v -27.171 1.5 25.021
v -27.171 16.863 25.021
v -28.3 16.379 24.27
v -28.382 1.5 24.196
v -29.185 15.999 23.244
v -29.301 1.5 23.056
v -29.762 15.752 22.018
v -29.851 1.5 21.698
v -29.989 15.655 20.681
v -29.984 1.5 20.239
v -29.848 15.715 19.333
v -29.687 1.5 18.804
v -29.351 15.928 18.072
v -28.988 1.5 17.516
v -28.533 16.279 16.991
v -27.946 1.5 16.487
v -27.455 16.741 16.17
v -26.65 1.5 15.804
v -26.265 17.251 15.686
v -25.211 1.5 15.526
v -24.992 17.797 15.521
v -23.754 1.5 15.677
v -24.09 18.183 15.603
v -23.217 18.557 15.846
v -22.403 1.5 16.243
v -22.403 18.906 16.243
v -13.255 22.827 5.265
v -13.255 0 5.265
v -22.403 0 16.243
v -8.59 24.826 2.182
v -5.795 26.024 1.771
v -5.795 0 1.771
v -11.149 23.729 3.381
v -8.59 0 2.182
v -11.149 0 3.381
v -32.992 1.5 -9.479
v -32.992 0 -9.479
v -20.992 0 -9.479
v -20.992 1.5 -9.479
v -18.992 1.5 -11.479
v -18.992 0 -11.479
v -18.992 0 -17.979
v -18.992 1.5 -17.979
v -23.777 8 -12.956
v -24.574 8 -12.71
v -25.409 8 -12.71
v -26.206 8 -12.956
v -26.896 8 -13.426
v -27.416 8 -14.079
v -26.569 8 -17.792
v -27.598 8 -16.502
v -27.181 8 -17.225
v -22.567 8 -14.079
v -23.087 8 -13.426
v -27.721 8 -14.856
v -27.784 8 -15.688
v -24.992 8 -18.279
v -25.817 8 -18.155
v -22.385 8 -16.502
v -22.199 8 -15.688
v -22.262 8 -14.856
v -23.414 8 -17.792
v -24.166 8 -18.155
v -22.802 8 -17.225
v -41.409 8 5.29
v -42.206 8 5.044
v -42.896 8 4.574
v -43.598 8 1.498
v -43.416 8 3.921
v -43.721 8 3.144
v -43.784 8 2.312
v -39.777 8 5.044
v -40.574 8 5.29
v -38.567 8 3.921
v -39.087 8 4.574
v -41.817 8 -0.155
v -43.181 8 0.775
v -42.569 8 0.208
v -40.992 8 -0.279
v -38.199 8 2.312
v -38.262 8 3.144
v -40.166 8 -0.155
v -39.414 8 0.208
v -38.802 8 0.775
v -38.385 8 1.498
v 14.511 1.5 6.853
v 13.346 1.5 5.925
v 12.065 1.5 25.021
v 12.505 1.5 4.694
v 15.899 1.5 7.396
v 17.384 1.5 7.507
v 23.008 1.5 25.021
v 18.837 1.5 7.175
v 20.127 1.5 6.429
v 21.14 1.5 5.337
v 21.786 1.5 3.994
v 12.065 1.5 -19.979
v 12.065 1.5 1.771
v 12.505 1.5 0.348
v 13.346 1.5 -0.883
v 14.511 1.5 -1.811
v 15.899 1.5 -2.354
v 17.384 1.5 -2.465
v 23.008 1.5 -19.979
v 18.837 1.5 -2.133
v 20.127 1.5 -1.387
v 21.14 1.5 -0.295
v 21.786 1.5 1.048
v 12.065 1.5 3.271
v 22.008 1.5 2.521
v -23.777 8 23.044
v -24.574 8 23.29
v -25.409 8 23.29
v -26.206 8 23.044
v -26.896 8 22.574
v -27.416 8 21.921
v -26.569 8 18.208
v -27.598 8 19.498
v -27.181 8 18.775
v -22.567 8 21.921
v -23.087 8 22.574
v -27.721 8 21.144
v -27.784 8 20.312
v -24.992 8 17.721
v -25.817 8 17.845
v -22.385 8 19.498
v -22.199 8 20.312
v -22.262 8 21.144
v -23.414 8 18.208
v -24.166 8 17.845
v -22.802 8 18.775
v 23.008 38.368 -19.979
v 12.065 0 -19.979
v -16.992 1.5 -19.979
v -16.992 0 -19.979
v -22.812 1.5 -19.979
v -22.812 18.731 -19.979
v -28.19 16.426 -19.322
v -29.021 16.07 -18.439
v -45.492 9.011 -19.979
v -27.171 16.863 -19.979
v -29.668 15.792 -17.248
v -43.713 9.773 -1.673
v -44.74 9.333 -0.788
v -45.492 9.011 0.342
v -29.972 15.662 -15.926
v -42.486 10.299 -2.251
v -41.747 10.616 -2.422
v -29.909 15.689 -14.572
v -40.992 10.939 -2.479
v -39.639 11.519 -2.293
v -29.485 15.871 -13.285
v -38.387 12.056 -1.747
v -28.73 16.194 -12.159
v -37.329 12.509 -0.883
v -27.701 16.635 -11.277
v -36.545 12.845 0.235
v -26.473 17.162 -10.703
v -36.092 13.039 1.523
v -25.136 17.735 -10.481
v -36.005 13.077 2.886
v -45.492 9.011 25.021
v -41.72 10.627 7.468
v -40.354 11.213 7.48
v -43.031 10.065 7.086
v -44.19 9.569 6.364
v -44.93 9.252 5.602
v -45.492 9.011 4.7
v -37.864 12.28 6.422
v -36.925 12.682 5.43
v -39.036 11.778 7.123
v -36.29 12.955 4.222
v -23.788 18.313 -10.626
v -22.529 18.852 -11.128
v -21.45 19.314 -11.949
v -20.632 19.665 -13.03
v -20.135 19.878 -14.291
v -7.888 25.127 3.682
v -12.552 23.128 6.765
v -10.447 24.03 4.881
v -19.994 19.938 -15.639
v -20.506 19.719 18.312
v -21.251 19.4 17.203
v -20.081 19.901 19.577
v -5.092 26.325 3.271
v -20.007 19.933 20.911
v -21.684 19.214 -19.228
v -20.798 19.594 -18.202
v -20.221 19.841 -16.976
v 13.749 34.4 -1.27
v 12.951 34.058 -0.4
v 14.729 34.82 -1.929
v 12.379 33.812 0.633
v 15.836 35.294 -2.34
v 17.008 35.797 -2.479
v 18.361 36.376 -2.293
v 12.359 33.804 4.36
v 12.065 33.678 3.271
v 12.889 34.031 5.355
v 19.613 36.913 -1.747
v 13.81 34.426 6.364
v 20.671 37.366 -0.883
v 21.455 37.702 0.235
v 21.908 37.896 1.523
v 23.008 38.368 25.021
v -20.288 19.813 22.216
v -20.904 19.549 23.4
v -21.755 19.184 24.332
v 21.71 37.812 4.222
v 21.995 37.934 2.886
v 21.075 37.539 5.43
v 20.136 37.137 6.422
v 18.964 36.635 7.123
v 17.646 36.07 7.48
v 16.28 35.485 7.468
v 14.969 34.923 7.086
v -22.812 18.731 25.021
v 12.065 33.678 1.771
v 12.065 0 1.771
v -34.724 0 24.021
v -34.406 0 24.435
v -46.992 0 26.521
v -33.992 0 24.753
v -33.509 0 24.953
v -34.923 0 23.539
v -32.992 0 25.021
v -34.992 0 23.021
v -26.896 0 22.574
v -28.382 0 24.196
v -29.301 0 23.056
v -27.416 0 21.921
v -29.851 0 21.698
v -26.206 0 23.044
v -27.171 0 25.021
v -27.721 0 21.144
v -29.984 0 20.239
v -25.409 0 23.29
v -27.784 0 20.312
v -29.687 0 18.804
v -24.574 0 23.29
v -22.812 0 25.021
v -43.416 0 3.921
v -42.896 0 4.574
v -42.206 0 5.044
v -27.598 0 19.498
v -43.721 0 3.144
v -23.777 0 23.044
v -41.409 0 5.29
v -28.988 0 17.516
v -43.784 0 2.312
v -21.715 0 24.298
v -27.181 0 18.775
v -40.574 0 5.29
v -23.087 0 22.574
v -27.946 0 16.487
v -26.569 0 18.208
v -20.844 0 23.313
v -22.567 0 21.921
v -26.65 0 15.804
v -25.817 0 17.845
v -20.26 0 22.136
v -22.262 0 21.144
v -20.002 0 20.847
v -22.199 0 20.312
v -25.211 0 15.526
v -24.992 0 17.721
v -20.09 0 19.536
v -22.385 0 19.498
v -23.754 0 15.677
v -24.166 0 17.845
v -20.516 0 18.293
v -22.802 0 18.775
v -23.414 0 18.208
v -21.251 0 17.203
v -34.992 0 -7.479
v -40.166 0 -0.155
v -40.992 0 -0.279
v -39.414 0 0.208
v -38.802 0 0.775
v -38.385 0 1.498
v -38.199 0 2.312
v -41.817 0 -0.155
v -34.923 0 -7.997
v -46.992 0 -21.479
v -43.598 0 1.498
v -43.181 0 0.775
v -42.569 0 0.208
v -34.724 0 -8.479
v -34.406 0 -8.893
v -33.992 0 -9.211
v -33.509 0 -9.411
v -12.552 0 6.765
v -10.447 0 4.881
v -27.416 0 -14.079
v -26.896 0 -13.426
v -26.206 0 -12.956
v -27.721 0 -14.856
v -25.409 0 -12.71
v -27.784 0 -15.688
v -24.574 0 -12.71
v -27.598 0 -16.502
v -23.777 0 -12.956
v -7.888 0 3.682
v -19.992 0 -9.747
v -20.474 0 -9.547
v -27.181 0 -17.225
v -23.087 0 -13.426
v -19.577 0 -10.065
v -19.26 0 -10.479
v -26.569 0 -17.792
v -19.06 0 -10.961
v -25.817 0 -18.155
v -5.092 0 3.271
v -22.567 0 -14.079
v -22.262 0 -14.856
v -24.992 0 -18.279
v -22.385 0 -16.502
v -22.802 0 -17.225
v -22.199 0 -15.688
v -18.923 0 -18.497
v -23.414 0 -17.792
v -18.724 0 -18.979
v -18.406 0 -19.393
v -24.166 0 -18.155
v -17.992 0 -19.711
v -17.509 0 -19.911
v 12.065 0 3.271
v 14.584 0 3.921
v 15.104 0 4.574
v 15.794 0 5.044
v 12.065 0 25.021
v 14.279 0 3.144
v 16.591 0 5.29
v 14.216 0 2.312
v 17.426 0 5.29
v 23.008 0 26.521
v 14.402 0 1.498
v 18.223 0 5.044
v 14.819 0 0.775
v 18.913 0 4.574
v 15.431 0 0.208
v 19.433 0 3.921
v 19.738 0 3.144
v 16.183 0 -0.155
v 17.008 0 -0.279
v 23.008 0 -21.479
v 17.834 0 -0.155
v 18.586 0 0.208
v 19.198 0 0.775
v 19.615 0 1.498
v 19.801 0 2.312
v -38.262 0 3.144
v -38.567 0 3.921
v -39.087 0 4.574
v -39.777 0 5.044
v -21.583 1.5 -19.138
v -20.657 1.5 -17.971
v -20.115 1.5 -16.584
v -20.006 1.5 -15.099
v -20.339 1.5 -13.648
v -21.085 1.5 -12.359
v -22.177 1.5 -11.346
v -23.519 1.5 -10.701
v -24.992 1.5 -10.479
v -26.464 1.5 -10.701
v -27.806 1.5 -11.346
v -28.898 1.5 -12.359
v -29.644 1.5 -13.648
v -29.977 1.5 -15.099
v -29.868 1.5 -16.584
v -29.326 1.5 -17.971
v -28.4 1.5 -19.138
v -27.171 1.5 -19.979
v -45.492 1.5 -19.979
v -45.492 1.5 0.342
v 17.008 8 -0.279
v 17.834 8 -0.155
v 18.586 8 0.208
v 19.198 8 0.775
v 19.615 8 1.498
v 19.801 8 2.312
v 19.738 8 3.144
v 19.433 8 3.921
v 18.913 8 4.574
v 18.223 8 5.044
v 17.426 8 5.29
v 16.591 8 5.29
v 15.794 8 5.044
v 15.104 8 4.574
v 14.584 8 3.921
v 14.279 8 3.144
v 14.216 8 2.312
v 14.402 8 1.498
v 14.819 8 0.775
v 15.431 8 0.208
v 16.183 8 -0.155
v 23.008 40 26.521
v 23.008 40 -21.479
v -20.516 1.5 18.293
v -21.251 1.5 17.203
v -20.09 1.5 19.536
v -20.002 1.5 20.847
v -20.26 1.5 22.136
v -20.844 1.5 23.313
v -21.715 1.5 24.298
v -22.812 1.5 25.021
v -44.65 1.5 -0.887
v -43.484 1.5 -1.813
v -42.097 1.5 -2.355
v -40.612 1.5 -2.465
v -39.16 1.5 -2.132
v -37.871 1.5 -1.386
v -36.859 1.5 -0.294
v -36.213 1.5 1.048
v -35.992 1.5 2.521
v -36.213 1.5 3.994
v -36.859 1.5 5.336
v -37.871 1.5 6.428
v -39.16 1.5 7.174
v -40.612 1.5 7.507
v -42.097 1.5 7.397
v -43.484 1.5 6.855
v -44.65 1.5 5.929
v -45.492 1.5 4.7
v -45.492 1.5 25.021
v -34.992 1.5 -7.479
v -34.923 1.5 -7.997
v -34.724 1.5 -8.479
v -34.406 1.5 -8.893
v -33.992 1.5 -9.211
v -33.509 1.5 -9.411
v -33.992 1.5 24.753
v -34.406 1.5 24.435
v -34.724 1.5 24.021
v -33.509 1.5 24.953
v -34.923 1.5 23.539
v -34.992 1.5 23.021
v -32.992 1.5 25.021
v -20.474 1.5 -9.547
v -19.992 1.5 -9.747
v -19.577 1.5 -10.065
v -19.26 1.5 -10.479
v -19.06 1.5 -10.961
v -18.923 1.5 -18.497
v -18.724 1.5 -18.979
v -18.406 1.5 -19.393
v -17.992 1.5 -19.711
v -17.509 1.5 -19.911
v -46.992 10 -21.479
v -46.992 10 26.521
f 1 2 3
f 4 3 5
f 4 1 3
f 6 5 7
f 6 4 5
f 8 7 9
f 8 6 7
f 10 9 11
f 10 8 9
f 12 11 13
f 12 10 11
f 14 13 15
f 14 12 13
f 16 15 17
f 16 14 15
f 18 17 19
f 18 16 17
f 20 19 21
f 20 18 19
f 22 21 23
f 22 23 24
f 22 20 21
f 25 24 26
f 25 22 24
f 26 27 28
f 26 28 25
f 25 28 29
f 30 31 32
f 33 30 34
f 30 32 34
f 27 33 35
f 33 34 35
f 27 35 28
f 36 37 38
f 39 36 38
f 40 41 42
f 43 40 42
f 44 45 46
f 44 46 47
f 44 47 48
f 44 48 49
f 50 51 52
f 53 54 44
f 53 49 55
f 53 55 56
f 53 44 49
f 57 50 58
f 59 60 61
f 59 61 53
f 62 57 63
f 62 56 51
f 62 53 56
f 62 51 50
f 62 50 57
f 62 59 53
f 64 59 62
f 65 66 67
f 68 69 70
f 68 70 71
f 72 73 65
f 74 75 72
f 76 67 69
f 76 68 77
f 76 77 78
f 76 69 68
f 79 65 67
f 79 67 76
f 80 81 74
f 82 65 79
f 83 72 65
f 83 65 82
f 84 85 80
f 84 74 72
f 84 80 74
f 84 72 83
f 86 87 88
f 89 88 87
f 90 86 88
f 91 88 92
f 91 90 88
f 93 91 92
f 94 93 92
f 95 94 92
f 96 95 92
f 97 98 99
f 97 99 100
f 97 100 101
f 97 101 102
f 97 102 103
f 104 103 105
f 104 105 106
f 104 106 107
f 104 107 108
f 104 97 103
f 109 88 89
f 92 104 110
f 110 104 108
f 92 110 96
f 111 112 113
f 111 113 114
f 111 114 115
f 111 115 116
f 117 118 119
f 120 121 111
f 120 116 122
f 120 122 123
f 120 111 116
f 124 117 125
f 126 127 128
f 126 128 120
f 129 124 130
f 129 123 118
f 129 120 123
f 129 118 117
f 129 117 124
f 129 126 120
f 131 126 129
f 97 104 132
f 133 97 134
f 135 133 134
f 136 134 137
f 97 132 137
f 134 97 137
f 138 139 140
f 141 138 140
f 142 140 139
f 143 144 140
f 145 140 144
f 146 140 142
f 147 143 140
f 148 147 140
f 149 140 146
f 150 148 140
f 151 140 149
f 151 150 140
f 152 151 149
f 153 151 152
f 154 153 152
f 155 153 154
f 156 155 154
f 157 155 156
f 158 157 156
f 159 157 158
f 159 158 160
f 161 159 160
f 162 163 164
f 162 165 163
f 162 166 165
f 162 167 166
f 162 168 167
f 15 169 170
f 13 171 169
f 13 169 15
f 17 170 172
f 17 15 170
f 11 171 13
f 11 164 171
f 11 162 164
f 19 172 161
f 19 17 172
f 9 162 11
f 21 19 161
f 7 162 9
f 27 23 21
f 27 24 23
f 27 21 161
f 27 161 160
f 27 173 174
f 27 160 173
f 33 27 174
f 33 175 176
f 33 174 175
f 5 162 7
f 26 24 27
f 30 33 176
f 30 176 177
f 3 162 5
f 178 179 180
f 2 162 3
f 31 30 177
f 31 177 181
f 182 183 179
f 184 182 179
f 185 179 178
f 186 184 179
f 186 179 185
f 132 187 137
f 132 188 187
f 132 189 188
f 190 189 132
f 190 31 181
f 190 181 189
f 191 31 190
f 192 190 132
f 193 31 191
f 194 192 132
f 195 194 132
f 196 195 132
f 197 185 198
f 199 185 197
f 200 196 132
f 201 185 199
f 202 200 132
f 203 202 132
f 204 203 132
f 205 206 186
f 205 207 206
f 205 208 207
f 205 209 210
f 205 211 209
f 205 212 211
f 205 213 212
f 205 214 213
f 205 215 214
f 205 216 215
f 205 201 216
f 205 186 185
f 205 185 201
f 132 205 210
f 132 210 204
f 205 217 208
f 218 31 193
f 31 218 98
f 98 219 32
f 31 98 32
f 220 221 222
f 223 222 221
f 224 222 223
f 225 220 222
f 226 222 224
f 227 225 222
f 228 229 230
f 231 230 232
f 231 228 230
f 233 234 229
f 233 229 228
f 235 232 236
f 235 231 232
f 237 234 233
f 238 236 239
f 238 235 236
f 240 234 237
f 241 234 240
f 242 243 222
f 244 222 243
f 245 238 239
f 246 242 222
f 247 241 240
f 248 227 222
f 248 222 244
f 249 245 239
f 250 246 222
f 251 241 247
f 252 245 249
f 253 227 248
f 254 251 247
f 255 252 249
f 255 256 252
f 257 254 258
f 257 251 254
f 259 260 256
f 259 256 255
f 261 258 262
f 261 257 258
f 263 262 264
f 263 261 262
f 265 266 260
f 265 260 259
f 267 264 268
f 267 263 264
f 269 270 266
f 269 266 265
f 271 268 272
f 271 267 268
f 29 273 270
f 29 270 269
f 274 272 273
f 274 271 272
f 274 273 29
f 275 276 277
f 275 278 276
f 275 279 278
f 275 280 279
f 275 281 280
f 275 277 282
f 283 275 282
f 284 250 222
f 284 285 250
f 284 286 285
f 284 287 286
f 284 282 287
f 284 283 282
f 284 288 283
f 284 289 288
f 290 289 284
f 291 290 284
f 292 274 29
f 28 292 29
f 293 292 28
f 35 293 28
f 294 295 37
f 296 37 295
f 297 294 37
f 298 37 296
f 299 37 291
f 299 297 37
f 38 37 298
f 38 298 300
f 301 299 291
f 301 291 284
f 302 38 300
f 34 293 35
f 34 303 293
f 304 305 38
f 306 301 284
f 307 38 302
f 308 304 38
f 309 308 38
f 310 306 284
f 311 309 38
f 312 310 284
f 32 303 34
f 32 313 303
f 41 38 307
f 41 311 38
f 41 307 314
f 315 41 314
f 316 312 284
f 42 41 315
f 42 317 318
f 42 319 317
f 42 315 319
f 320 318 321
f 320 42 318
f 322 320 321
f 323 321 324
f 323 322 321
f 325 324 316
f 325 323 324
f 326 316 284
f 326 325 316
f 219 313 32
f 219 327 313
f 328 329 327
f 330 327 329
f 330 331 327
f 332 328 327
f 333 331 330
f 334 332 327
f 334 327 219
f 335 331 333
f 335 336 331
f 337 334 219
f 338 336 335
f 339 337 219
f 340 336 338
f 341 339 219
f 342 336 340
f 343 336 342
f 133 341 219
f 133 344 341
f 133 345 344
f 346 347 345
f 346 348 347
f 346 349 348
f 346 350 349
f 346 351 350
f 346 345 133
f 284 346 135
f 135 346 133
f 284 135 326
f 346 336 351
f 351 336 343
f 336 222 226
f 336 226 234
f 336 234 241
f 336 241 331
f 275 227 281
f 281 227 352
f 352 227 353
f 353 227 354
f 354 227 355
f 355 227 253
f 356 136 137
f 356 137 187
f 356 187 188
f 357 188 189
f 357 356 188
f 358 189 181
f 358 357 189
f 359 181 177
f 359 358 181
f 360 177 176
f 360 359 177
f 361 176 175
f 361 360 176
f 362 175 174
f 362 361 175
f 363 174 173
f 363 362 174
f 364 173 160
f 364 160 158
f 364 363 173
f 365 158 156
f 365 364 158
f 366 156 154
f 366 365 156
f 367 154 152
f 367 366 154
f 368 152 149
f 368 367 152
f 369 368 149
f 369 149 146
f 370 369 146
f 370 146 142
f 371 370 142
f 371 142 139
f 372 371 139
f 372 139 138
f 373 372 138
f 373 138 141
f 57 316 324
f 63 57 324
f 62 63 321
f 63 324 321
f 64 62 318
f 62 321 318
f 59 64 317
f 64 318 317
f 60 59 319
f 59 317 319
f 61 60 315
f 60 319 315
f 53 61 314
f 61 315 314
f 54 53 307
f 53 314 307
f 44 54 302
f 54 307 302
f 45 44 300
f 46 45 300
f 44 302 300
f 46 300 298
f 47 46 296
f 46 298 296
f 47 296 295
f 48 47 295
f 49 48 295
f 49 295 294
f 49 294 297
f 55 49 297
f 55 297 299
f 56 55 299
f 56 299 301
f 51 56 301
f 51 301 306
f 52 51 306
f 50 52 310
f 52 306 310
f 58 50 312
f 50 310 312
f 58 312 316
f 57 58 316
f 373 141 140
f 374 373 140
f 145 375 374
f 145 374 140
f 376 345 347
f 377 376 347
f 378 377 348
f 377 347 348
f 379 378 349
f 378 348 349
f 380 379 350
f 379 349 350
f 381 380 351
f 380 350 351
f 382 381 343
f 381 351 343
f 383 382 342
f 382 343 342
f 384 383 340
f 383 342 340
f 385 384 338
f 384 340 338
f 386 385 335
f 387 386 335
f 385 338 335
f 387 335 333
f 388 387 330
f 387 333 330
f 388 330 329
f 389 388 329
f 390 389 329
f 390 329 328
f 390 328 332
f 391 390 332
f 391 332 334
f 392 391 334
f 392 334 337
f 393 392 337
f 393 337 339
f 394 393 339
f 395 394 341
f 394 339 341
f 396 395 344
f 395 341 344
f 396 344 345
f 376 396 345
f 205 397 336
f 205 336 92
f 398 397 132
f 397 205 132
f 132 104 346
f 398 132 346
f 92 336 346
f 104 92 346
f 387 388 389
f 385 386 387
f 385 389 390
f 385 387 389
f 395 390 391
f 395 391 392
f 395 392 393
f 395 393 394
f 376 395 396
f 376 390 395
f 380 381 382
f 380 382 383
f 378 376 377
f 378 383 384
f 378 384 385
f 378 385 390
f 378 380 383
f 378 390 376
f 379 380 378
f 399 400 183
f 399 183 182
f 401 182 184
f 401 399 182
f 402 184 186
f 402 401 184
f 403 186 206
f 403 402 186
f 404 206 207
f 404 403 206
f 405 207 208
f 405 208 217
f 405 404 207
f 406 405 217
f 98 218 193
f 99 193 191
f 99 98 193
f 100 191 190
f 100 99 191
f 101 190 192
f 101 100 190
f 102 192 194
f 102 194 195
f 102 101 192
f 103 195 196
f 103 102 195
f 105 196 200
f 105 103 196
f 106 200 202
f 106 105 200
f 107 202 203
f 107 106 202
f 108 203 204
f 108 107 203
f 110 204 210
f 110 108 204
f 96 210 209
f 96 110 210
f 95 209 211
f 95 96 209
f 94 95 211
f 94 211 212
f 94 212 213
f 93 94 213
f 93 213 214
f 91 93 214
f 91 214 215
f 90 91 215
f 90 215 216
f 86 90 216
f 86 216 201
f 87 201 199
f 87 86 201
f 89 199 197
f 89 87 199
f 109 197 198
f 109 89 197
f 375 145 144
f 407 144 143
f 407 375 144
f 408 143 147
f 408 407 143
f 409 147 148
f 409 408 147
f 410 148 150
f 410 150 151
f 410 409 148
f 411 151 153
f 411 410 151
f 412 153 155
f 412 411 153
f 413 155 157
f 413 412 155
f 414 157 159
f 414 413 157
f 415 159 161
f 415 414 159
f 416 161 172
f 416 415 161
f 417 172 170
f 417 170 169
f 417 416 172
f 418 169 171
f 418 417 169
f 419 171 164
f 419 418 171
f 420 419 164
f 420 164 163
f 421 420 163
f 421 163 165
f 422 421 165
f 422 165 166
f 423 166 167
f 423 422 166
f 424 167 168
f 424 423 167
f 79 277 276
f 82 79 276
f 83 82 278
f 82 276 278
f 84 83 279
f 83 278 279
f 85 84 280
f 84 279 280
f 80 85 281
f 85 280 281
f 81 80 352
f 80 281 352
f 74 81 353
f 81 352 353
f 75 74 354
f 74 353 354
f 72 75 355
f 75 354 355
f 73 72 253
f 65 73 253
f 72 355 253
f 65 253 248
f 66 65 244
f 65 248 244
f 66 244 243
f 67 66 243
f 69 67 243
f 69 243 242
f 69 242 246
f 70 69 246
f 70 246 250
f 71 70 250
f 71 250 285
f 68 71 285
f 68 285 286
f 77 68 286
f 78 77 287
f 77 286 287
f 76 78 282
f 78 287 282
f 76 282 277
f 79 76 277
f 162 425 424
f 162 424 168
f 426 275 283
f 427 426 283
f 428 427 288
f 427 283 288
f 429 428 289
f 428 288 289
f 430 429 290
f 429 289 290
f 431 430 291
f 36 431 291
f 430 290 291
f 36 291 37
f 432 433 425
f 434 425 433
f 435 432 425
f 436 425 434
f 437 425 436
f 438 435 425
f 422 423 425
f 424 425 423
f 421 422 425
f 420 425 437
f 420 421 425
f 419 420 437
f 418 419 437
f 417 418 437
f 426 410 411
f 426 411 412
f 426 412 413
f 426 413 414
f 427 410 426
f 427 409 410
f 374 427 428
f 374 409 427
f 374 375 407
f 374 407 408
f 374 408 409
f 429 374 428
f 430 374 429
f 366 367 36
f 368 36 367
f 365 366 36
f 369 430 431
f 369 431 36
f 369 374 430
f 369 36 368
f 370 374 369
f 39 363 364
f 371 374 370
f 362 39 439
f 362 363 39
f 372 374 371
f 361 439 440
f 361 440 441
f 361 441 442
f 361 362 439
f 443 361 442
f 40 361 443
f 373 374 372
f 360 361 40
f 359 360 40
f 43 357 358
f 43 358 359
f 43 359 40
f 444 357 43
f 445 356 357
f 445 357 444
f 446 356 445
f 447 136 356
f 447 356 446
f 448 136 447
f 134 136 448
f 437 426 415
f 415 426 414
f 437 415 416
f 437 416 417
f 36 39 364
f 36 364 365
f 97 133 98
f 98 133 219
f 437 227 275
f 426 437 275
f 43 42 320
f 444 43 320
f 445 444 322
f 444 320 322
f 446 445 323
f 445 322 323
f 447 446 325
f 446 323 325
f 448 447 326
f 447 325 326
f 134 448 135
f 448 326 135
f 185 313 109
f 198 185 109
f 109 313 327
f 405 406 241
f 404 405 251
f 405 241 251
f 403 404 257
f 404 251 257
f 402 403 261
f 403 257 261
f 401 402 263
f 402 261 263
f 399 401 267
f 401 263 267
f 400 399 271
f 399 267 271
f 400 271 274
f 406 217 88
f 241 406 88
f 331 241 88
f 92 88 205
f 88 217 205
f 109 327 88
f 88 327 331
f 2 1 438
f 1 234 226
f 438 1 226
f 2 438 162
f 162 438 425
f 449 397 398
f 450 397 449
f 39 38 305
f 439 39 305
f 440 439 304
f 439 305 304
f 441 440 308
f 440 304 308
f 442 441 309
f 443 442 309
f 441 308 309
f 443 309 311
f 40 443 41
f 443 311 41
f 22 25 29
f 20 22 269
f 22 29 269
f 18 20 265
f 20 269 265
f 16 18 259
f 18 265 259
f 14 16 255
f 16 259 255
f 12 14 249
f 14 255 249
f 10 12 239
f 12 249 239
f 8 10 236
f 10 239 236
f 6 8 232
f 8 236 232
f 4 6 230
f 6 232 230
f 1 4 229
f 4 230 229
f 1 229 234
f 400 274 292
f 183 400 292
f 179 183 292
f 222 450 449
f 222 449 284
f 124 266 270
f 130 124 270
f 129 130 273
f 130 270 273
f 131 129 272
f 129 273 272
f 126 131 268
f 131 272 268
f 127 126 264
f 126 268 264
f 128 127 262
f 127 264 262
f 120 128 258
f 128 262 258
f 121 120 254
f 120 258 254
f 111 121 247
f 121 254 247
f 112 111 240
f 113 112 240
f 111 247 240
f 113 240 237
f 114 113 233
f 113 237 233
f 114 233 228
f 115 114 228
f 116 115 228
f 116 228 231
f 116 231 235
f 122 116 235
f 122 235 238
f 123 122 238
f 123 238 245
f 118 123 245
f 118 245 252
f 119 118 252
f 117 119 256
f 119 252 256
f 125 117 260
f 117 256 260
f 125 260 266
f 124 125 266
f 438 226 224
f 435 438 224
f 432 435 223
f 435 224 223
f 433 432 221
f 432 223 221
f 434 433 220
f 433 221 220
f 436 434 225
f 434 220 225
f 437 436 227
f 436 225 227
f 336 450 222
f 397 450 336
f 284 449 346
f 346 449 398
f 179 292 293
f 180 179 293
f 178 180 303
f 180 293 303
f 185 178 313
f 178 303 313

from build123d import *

# Parameters (mm, degrees)
SKETCH1_W           = 70
SKETCH1_H           = 48
BOSS_EXTRUDE1_DEPTH = 1.5
BOSS_EXTRUDE2_DEPTH = 48
BOSS_EXTRUDE3_DEPTH = 1.5
BOSS_EXTRUDE4_DEPTH = 1.5
SKETCH9_R           = 5
BOSS_EXTRUDE5_DEPTH = 50
SKETCH10_R          = 2.8
CUT_EXTRUDE1_DEPTH  = 8
BOSS_EXTRUDE7_START = -50
BOSS_EXTRUDE7_DEPTH = 48.5
CUT_EXTRUDE4_DEPTH  = 52.511197813
CUT_EXTRUDE6_DEPTH  = 1.5


# Read off the part's stored shape, not the designer's step: Boss-Extrude7
with BuildPart() as part:
    # Sketch1 → Boss-Extrude1 (new body)
    with BuildSketch(Plane(origin=(0, 0, 0), x_dir=(1, 0, 0), z_dir=(0, 1, 0))):
        with Locations((-11.991596639, -2.521008403)):
            Rectangle(SKETCH1_W, SKETCH1_H)
    extrude(amount=BOSS_EXTRUDE1_DEPTH)

    # Sketch13 → Boss-Extrude2 (add)
    with BuildSketch(Plane.XY.offset(26.521008403)):
        Polygon((-46.991596639, 10), (-46.991596639, 1.5), (-45.491596639, 1.5), (-45.491596639, 9.010905763), (23.008403361, 38.36804862), (23.008403361, 40), align=None)
    extrude(amount=-BOSS_EXTRUDE2_DEPTH)

    # Sketch14 → Boss-Extrude3 (add)
    with BuildSketch(Plane.XY.offset(26.521008403)):
        Polygon((-46.991596639, 0), (23.008403361, 0), (23.008403361, 40), (-46.991596639, 10), align=None)
    extrude(amount=-BOSS_EXTRUDE3_DEPTH)

    # Sketch15 → Boss-Extrude4 (add)
    with BuildSketch(Plane(origin=(0, 0, -21.478991597), x_dir=(-1, 0, 0), z_dir=(0, 0, -1))):
        Polygon((-23.008403361, 0), (46.991596639, 0), (46.991596639, 10), (-23.008403361, 40), align=None)
    extrude(amount=-BOSS_EXTRUDE4_DEPTH)

    # Sketch9 → Boss-Extrude5 (add)
    with BuildSketch(Plane.XZ):
        with Locations(Location((-40.991596639, 2.521008403, 0), (0, 0, 270))):
            Circle(SKETCH9_R)
        with Locations(Location((-24.991596639, 20.521008403, 0), (0, 0, 270))):
            Circle(SKETCH9_R)
        with Locations(Location((17.008403361, 2.521008403, 0), (0, 0, 270))):
            Circle(SKETCH9_R)
        with Locations(Location((-24.991596639, -15.478991597, 0), (0, 0, 270))):
            Circle(SKETCH9_R)
    extrude(amount=-BOSS_EXTRUDE5_DEPTH)

    # Sketch10 → Cut-Extrude1 (cut)
    with BuildSketch(Plane.XZ):
        with Locations(Location((-40.991596639, 2.521008403, 0), (0, 0, 270))):
            Circle(SKETCH10_R)
        with Locations(Location((-24.991596639, 20.521008403, 0), (0, 0, 270))):
            Circle(SKETCH10_R)
        with Locations(Location((-24.991596639, -15.478991597, 0), (0, 0, 270))):
            Circle(SKETCH10_R)
        with Locations(Location((17.008403361, 2.521008403, 0), (0, 0, 270))):
            Circle(SKETCH10_R)
    extrude(amount=-CUT_EXTRUDE1_DEPTH, mode=Mode.SUBTRACT)

    # Boss-Extrude7 outline → Boss-Extrude7 (add)
    with BuildSketch(Plane.XZ.offset(BOSS_EXTRUDE7_START)):
        with BuildLine():
            ThreePointArc((-21.250723923, 17.203498596), (-21.79067464, 16.679902005), (-22.403055842, 16.243221996))
            Line((-22.403055842, 16.243221996), (-13.254543259, 5.265006896))
            ThreePointArc((-13.254543259, 5.265006896), (-9.913482791, 2.687784718), (-5.794711082, 1.771008403))
            Line((-5.794711082, 1.771008403), (12.064973378, 1.771008403))
            ThreePointArc((12.064973378, 1.771008403), (12.008403361, 2.521008403), (12.064973378, 3.271008403))
            Line((12.064973378, 3.271008403), (-5.092148663, 3.271008403))
            ThreePointArc((-5.092148663, 3.271008403), (-9.210920372, 4.187784718), (-12.55198084, 6.765006896))
            Line((-12.55198084, 6.765006896), (-21.250723923, 17.203498596))
        make_face()
    extrude(amount=BOSS_EXTRUDE7_DEPTH)

    # Sketch20 → Cut-Extrude4 (cut, through all)
    with BuildSketch(Plane(origin=(-10.912489134, 25.462474645, 0), x_dir=(0.9191450300180579, 0.3939192985791677, 0), z_dir=(-0.3939192985791677, 0.9191450300180579, 0))):
        with BuildLine():
            add(Edge.make_bspline(
                [(-15.317612613, 20.478991597), (-24.739688298, 20.478991597), (-20.028650455, 12.978991597), (-15.317612613, 5.478991597), (-10.606574771, 12.978991597), (-5.895536929, 20.478991597), (-15.317612613, 20.478991597)],
                knots=[4.71238898, 4.71238898, 4.71238898, 6.806784083, 6.806784083, 8.901179185, 8.901179185, 10.995574288, 10.995574288, 10.995574288], degree=2, weights=[1, 0.5, 1, 0.5, 1, 0.5, 1]))
        make_face()
        with BuildLine():
            add(Edge.make_bspline(
                [(24.998734434, -3.271008403), (26.776327601, -14.040210809), (34.50198737, -5.780609606), (42.227647139, 2.478991597), (30.377026022, 2.478991597)],
                knots=[0.150568273, 0.150568273, 0.150568273, 2.431478627, 2.431478627, 4.71238898, 4.71238898, 4.71238898], degree=2, weights=[1, 0.417180872, 1, 0.417180872, 1]))
            add(Edge.make_bspline(
                [(30.377026022, 2.478991597), (25.700250728, 2.478991597), (24.998734434, -1.771008403)],
                knots=[4.71238898, 4.71238898, 4.71238898, 6.132617034, 6.132617034, 6.132617034], degree=2, weights=[1, 0.758287544, 1]))
            Line((24.998734434, -1.771008403), (5.567976635, -1.771008403))
            add(Edge.make_bspline(
                [(5.567976635, -1.771008403), (0.619718616, -1.771008404), (-2.548078974, -5.265006896)],
                knots=[1.570796327, 1.570796327, 1.570796327, 2.446854377, 2.446854377, 2.446854377], degree=2, weights=[1, 0.905589421, 1]))
            Line((-2.548078974, -5.265006896), (-12.50136413, -16.243221996))
            add(Edge.make_bspline(
                [(-12.50136413, -16.243221996), (-13.799875321, -15.521008403), (-15.317612613, -15.521008403)],
                knots=[4.168218977, 4.168218977, 4.168218977, 4.71238898, 4.71238898, 4.71238898], degree=2, weights=[1, 0.963212666, 1]))
            add(Edge.make_bspline(
                [(-15.317612613, -15.521008403), (-22.262261076, -15.521008403), (-20.599158718, -21.718406923), (-18.936056359, -27.915805443), (-12.787966418, -24.947503117), (-6.639876476, -21.979200791), (-11.247664353, -17.203498596)],
                knots=[4.71238898, 4.71238898, 4.71238898, 6.525015233, 6.525015233, 8.337641486, 8.337641486, 10.150267739, 10.150267739, 10.150267739], degree=2, weights=[1, 0.616652372, 1, 0.616652372, 1, 0.616652372, 1]))
            Line((-11.247664353, -17.203498596), (-1.783713835, -6.765006896))
            add(Edge.make_bspline(
                [(6.332341775, -3.271008403), (1.384083756, -3.271008404), (-1.783713835, -6.765006896)],
                knots=[1.570796327, 1.570796327, 1.570796327, 2.446854377, 2.446854377, 2.446854377], degree=2, weights=[1, 0.905589421, 1]))
            Line((6.332341775, -3.271008403), (24.998734434, -3.271008403))
        make_face()
        with BuildLine():
            add(Edge.make_bspline(
                [(-32.725093998, 2.478991597), (-42.147169682, 2.478991597), (-37.43613184, -5.021008403), (-32.725093998, -12.521008403), (-28.014056156, -5.021008403), (-23.303018313, 2.478991597), (-32.725093998, 2.478991597)],
                knots=[4.71238898, 4.71238898, 4.71238898, 6.806784083, 6.806784083, 8.901179185, 8.901179185, 10.995574288, 10.995574288, 10.995574288], degree=2, weights=[1, 0.5, 1, 0.5, 1, 0.5, 1]))
        make_face()
    extrude(amount=CUT_EXTRUDE4_DEPTH, mode=Mode.SUBTRACT)


with BuildPart() as cut_extrude4_kept_piece:
    # of the separate pieces the step leaves, the one the design keeps (cut_extrude4_pieces_kept)
    add(part.part.solids().sort_by_distance((-46.991596639, 0, -21.478991597))[0])

    # Sketch22 → Cut-Extrude6 (cut)
    with BuildSketch(Plane.XZ):
        with BuildLine():
            Line((12.064973378, 3.271008403), (12.064973378, 25.021008403))
            Line((12.064973378, 25.021008403), (-22.812147167, 25.021008403))
            ThreePointArc((-22.812147167, 25.021008403), (-20.088442695, 21.500335417), (-21.250723923, 17.203498596))
            Line((-21.250723923, 17.203498596), (-12.55198084, 6.765006896))
            ThreePointArc((-12.55198084, 6.765006896), (-9.210920372, 4.187784718), (-5.092148663, 3.271008403))
            Line((-5.092148663, 3.271008403), (12.064973378, 3.271008403))
        make_face()
        with BuildLine():
            Line((-16.991596639, -19.978991597), (12.064973378, -19.978991597))
            Line((12.064973378, -19.978991597), (12.064973378, 1.771008403))
            Line((12.064973378, 1.771008403), (-5.794711082, 1.771008403))
            ThreePointArc((-5.794711082, 1.771008403), (-9.913482791, 2.687784718), (-13.254543259, 5.265006896))
            Line((-13.254543259, 5.265006896), (-22.403055842, 16.243221996))
            ThreePointArc((-22.403055842, 16.243221996), (-29.385253712, 18.134425591), (-27.17104611, 25.021008403))
            Line((-27.17104611, 25.021008403), (-32.991596639, 25.021008403))
            ThreePointArc((-32.991596639, 25.021008403), (-34.405810201, 24.435221966), (-34.991596639, 23.021008403))
            Line((-34.991596639, 23.021008403), (-34.991596639, -7.478991597))
            ThreePointArc((-34.991596639, -7.478991597), (-34.405810201, -8.893205159), (-32.991596639, -9.478991597))
            Line((-32.991596639, -9.478991597), (-20.991596639, -9.478991597))
            ThreePointArc((-20.991596639, -9.478991597), (-19.577383076, -10.064778034), (-18.991596639, -11.478991597))
            Line((-18.991596639, -11.478991597), (-18.991596639, -17.978991597))
            ThreePointArc((-18.991596639, -17.978991597), (-18.405810201, -19.393205159), (-16.991596639, -19.978991597))
        make_face()
    extrude(amount=-CUT_EXTRUDE6_DEPTH, mode=Mode.SUBTRACT)


solid = cut_extrude4_kept_piece.part
